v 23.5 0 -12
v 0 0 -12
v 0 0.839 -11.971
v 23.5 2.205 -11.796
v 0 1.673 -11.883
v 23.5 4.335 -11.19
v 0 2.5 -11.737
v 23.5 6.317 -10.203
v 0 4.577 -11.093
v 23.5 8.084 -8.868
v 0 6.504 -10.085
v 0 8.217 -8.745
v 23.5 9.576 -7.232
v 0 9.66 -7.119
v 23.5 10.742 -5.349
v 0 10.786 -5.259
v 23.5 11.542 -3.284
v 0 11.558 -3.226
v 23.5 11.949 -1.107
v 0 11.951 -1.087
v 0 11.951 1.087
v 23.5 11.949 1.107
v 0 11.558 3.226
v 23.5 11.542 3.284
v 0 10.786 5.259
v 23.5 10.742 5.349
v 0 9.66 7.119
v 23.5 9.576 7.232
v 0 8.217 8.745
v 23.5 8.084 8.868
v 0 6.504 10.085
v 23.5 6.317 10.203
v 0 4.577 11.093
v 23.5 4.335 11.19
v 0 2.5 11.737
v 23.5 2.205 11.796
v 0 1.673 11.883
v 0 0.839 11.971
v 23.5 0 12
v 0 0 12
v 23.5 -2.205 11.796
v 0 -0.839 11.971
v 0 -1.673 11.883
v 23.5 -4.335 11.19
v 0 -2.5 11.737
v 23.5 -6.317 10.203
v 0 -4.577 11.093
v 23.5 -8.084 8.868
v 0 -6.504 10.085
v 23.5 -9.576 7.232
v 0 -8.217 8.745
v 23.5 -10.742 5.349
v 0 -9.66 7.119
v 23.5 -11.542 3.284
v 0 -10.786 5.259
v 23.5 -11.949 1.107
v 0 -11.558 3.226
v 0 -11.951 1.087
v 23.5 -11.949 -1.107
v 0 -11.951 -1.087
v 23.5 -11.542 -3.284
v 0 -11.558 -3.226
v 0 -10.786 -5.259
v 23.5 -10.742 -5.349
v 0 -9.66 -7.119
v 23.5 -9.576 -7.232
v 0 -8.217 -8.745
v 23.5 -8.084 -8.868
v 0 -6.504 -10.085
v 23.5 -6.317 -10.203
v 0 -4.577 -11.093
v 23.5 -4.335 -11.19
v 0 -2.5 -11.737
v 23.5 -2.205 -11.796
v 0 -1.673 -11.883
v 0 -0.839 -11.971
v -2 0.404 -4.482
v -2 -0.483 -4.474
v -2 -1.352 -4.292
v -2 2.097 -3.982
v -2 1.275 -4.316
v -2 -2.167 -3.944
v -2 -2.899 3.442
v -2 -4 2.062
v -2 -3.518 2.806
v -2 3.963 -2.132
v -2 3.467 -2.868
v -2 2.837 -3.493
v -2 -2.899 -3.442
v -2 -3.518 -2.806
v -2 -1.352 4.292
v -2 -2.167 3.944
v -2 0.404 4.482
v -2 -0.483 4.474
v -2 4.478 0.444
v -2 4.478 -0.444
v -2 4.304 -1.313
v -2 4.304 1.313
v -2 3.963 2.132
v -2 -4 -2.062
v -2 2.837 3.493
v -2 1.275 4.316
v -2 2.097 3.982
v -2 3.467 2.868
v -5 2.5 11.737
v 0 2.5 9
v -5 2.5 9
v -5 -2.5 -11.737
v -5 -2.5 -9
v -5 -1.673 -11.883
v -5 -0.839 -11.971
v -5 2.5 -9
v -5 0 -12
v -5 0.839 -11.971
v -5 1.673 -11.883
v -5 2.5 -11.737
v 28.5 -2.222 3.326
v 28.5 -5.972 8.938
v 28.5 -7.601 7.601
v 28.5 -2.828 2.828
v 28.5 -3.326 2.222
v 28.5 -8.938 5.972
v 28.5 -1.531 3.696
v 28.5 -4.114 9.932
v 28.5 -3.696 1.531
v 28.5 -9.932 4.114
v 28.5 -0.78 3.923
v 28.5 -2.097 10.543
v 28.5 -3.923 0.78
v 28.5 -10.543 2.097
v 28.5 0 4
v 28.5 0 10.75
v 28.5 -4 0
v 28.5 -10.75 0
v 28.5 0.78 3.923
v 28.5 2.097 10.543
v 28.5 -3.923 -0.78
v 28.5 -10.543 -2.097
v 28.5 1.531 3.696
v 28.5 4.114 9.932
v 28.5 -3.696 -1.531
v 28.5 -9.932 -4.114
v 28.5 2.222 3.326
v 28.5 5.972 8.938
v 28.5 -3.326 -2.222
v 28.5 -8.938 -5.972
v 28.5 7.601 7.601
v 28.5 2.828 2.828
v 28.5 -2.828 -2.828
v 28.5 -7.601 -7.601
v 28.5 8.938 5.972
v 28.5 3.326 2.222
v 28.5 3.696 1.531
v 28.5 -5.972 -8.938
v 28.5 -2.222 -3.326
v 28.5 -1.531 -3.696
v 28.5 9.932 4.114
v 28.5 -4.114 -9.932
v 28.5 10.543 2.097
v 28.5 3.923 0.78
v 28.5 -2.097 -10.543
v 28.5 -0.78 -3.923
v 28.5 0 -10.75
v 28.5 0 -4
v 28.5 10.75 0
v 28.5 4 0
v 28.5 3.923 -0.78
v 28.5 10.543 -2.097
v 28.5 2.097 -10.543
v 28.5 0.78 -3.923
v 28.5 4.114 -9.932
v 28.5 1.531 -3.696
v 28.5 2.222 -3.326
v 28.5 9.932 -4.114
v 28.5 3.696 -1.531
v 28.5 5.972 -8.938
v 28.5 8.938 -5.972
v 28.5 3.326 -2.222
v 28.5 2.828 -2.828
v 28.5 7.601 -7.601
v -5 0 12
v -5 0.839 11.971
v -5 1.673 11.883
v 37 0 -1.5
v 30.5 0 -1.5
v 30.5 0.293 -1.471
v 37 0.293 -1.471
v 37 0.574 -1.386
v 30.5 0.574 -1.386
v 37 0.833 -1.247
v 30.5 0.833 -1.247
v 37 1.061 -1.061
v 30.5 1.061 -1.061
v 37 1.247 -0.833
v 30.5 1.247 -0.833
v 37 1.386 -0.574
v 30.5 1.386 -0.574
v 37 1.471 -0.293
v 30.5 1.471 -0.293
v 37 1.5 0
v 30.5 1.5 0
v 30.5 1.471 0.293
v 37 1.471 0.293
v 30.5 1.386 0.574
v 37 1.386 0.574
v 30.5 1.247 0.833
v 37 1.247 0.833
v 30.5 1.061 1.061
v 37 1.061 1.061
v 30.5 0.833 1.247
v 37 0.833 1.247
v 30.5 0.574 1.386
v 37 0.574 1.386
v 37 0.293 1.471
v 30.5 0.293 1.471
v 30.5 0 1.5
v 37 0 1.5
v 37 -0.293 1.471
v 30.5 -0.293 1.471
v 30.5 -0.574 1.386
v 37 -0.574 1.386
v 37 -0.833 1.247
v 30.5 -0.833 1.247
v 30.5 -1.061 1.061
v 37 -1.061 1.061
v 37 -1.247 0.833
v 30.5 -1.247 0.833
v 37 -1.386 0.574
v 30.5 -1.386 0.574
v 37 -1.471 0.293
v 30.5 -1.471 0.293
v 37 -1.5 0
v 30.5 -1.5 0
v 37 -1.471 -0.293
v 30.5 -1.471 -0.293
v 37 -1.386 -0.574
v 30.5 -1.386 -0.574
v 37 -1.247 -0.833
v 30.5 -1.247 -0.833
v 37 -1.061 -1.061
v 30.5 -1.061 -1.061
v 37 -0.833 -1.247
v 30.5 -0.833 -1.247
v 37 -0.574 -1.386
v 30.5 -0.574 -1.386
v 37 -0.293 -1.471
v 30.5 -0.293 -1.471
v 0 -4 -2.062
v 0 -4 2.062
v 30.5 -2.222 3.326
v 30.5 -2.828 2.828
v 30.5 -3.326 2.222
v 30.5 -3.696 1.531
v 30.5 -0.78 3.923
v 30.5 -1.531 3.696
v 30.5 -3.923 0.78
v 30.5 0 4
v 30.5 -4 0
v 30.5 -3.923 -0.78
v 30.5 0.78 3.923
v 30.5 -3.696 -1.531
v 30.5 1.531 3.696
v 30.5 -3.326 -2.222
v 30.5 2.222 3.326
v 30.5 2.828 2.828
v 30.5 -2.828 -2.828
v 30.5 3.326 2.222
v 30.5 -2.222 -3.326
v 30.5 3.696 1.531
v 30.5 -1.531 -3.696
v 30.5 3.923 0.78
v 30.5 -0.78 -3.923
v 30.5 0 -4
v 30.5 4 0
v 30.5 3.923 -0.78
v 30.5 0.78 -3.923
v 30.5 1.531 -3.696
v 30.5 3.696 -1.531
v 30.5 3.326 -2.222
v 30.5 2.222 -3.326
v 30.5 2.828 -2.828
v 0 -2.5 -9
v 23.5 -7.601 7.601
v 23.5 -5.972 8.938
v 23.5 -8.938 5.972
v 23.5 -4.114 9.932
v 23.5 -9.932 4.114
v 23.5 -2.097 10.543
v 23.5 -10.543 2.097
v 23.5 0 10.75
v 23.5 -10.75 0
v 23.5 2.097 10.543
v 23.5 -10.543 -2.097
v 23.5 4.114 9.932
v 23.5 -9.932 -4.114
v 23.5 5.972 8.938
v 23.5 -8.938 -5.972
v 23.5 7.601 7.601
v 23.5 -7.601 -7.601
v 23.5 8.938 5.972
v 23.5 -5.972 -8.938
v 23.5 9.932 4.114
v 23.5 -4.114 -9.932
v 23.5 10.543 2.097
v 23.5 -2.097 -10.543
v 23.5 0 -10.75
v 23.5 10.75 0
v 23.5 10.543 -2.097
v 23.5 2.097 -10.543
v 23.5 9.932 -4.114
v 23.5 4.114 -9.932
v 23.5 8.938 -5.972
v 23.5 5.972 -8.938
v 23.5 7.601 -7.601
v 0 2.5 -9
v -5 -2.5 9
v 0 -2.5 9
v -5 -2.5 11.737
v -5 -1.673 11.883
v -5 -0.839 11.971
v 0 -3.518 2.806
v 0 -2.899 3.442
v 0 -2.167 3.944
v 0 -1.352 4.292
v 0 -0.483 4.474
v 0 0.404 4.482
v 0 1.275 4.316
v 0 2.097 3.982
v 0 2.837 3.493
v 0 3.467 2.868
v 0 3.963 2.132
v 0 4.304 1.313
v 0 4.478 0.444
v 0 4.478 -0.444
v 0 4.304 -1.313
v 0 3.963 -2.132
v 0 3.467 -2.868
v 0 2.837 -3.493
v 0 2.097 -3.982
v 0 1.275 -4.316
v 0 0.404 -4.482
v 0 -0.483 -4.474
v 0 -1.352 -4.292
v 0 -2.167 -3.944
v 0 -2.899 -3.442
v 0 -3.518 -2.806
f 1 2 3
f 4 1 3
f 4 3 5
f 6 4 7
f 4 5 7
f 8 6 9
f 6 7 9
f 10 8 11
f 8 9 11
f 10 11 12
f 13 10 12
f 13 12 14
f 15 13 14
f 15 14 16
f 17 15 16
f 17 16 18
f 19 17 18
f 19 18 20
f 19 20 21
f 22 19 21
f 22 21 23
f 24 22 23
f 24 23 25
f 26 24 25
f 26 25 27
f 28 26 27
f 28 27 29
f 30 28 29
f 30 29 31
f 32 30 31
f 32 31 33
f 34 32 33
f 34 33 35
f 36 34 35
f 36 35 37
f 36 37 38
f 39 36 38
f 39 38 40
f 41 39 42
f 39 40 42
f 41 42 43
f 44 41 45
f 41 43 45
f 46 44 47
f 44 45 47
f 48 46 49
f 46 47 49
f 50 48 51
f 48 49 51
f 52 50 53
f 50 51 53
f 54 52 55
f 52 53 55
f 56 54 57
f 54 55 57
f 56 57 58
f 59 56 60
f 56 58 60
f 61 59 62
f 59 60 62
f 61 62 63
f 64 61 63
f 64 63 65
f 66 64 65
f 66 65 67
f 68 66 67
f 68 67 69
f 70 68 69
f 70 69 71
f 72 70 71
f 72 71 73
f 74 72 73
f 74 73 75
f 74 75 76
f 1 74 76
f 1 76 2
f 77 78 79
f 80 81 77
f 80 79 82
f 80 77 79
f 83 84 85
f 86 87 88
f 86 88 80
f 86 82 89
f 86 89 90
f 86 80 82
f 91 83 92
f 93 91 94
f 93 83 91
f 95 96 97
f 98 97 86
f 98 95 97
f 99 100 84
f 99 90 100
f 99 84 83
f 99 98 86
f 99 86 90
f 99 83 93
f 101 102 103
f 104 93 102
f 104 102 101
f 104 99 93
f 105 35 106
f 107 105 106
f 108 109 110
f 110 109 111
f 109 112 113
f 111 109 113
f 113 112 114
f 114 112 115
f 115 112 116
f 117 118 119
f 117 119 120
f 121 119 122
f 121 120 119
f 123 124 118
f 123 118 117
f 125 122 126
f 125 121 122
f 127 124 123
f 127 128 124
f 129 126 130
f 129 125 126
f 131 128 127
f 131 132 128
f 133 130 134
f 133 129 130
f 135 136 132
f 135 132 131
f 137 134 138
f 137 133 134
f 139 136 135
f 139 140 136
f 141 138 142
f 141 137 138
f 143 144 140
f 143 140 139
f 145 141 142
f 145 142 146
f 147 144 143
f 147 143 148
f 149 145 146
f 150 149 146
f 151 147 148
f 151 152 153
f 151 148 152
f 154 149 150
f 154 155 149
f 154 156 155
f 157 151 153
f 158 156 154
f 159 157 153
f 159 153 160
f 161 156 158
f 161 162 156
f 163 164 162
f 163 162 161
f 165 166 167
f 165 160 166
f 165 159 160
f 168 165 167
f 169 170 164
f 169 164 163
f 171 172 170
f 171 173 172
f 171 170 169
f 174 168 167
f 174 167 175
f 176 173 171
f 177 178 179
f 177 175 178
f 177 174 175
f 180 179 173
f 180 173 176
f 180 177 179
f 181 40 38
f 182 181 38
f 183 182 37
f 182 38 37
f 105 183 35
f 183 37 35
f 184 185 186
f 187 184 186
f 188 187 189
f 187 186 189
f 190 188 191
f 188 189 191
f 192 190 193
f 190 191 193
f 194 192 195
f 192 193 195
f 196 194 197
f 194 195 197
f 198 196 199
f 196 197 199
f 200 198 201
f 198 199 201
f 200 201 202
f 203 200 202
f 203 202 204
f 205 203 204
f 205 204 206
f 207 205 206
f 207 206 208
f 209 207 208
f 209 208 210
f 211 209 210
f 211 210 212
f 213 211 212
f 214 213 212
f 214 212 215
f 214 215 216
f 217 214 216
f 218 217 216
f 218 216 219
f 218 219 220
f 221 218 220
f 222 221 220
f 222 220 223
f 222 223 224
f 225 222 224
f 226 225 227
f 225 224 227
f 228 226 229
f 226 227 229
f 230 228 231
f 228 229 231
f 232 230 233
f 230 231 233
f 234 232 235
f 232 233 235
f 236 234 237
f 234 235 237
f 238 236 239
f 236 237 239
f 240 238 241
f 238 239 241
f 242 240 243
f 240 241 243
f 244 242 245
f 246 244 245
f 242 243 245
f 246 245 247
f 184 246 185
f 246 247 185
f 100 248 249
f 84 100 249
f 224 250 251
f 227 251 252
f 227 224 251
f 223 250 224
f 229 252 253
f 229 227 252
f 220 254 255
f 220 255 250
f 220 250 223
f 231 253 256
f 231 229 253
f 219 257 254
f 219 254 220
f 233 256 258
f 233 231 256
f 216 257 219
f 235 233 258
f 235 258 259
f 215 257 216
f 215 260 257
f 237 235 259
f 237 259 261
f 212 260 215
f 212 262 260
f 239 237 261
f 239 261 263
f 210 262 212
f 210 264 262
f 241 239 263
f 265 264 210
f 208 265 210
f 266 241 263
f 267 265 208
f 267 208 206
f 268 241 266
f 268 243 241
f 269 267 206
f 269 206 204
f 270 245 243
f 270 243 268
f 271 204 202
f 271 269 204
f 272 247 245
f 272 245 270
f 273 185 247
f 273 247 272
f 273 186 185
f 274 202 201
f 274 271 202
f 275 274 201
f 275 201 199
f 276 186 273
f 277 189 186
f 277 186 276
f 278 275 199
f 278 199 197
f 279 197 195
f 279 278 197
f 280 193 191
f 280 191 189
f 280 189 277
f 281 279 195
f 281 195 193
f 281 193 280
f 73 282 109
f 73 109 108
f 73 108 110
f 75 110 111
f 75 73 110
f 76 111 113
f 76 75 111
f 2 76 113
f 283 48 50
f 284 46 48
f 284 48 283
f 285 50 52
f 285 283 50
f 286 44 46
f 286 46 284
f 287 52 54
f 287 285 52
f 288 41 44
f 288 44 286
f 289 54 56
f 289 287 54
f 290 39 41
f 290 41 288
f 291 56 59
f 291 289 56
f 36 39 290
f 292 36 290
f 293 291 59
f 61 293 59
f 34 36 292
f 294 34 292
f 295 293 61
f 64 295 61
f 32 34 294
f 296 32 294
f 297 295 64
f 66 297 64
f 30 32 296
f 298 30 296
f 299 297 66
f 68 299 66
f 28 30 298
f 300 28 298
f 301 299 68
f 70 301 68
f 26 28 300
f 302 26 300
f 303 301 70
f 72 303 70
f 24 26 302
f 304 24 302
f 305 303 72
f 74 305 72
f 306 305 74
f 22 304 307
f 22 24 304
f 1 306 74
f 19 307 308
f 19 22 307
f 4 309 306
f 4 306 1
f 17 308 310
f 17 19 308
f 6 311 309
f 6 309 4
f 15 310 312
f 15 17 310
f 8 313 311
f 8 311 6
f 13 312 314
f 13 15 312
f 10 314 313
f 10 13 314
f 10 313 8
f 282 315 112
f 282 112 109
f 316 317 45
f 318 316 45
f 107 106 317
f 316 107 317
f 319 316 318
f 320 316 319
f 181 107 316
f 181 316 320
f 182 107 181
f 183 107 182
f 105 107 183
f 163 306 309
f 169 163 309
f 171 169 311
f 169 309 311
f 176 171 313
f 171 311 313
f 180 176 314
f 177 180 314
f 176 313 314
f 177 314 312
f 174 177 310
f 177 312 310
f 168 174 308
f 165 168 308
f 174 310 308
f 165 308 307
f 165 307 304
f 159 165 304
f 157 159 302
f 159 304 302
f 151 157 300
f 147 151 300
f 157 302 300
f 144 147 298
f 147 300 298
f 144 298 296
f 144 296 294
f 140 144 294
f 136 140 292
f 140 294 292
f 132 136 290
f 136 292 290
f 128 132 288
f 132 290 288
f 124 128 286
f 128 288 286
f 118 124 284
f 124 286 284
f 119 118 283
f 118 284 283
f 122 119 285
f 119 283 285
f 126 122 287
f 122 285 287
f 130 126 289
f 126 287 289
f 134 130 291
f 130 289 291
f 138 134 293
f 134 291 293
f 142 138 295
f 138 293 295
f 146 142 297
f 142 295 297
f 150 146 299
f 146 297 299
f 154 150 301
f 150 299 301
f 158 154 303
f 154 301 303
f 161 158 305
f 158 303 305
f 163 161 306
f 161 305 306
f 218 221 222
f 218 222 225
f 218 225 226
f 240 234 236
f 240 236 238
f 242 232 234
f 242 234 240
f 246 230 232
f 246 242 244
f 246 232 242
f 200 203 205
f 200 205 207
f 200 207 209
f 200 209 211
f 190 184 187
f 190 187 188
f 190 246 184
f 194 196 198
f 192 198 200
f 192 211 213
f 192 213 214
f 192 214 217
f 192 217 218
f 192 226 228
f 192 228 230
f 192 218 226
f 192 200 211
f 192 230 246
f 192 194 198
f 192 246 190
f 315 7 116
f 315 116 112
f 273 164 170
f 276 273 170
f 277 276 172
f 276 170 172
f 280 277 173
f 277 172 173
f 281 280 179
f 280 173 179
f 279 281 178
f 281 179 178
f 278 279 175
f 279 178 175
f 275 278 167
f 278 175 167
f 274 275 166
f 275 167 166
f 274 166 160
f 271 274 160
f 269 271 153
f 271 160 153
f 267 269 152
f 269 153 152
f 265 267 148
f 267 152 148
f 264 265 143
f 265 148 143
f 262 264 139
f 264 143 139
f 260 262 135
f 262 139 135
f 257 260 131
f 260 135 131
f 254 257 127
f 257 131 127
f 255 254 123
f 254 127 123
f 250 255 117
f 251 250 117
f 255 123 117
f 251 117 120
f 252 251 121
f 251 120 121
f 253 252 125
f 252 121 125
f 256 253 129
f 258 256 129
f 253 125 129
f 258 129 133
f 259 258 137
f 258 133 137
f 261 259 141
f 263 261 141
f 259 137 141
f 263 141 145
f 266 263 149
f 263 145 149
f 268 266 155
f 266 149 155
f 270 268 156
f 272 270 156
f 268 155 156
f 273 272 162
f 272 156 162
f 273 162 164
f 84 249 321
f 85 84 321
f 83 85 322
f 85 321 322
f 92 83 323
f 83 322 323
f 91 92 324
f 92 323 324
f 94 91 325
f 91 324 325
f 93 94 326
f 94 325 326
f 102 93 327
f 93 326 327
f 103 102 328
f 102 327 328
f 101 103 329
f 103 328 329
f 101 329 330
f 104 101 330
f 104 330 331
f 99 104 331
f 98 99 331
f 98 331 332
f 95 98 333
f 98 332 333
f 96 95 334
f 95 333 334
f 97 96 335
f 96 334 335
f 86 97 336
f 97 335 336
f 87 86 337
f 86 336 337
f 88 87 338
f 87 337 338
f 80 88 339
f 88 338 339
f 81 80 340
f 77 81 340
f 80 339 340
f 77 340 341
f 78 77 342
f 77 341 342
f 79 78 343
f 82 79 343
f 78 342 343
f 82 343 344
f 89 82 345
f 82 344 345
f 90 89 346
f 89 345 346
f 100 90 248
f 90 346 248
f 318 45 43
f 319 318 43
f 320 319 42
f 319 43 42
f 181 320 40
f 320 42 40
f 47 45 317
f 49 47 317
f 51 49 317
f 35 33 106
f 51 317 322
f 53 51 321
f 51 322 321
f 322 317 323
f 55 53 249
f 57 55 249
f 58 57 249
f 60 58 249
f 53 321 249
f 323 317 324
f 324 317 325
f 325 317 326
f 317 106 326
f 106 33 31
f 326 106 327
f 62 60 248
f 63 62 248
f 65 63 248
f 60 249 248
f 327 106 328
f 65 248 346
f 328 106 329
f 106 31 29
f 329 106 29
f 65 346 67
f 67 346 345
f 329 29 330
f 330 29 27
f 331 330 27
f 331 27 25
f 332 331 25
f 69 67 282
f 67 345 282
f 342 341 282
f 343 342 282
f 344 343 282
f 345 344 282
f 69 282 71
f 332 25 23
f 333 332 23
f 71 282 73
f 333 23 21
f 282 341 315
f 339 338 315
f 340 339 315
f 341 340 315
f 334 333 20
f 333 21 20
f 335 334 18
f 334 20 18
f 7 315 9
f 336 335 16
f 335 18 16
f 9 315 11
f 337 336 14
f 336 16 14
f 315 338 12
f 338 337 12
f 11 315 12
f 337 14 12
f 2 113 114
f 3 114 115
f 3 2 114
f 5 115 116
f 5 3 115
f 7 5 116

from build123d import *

# Parameters (mm, degrees)
SKETCH_1_R      = 12
EXTRUDE_1_DEPTH = 23.5
SKETCH_2_R      = 1.5
EXTRUDE_2_DEPTH = 13.5
SKETCH_3_R      = 10.75
EXTRUDE_3_DEPTH = 5
SKETCH_4_R      = 4
EXTRUDE_4_DEPTH = 2
EXTRUDE_5_DEPTH = 2
EXTRUDE_6_DEPTH = 5


with BuildPart() as part:
    # 草图1 → 凸台-拉伸1 (new body)
    with BuildSketch(Plane(origin=(0, 0, 0), x_dir=(0, 0, -1), z_dir=(1, 0, 0))):
        Circle(SKETCH_1_R)
    extrude(amount=EXTRUDE_1_DEPTH)

    # 草图2 → 凸台-拉伸2 (add)
    with BuildSketch(Plane(origin=(23.5, 0, 0), x_dir=(0, 0, -1), z_dir=(1, 0, 0))):
        Circle(SKETCH_2_R)
    extrude(amount=EXTRUDE_2_DEPTH)

    # 草图3 → 凸台-拉伸3 (add)
    with BuildSketch(Plane(origin=(23.5, 0, 0), x_dir=(0, 0, -1), z_dir=(1, 0, 0))):
        Circle(SKETCH_3_R)
    extrude(amount=EXTRUDE_3_DEPTH)

    # 草图4 → 凸台-拉伸4 (add)
    with BuildSketch(Plane(origin=(28.5, 0, 0), x_dir=(0, 0, -1), z_dir=(1, 0, 0))):
        Circle(SKETCH_4_R)
    extrude(amount=EXTRUDE_4_DEPTH)

    # 草图5 → 凸台-拉伸5 (add)
    with BuildSketch(Plane.ZY):
        with BuildLine():
            Line((-2.061552813, -4), (2.061552813, -4))
            ThreePointArc((2.061552813, -4), (0, 4.5), (-2.061552813, -4))
        make_face()
    extrude(amount=EXTRUDE_5_DEPTH)

    # 草图6 → 凸台-拉伸6 (add)
    with BuildSketch(Plane.ZY):
        with BuildLine():
            Line((11.736694594, 2.5), (9, 2.5))
            Line((9, 2.5), (9, -2.5))
            Line((9, -2.5), (11.736694594, -2.5))
            ThreePointArc((11.736694594, -2.5), (11.933992105, -1.256913853), (12, 0))
            ThreePointArc((12, 0), (11.933992105, 1.256913853), (11.736694594, 2.5))
        make_face()
    extrude_6 = extrude(amount=EXTRUDE_6_DEPTH)

    # 镜向1: 凸台-拉伸6 across plane
    add(extrude_6.mirror(Plane.XY))


solid = part.part
